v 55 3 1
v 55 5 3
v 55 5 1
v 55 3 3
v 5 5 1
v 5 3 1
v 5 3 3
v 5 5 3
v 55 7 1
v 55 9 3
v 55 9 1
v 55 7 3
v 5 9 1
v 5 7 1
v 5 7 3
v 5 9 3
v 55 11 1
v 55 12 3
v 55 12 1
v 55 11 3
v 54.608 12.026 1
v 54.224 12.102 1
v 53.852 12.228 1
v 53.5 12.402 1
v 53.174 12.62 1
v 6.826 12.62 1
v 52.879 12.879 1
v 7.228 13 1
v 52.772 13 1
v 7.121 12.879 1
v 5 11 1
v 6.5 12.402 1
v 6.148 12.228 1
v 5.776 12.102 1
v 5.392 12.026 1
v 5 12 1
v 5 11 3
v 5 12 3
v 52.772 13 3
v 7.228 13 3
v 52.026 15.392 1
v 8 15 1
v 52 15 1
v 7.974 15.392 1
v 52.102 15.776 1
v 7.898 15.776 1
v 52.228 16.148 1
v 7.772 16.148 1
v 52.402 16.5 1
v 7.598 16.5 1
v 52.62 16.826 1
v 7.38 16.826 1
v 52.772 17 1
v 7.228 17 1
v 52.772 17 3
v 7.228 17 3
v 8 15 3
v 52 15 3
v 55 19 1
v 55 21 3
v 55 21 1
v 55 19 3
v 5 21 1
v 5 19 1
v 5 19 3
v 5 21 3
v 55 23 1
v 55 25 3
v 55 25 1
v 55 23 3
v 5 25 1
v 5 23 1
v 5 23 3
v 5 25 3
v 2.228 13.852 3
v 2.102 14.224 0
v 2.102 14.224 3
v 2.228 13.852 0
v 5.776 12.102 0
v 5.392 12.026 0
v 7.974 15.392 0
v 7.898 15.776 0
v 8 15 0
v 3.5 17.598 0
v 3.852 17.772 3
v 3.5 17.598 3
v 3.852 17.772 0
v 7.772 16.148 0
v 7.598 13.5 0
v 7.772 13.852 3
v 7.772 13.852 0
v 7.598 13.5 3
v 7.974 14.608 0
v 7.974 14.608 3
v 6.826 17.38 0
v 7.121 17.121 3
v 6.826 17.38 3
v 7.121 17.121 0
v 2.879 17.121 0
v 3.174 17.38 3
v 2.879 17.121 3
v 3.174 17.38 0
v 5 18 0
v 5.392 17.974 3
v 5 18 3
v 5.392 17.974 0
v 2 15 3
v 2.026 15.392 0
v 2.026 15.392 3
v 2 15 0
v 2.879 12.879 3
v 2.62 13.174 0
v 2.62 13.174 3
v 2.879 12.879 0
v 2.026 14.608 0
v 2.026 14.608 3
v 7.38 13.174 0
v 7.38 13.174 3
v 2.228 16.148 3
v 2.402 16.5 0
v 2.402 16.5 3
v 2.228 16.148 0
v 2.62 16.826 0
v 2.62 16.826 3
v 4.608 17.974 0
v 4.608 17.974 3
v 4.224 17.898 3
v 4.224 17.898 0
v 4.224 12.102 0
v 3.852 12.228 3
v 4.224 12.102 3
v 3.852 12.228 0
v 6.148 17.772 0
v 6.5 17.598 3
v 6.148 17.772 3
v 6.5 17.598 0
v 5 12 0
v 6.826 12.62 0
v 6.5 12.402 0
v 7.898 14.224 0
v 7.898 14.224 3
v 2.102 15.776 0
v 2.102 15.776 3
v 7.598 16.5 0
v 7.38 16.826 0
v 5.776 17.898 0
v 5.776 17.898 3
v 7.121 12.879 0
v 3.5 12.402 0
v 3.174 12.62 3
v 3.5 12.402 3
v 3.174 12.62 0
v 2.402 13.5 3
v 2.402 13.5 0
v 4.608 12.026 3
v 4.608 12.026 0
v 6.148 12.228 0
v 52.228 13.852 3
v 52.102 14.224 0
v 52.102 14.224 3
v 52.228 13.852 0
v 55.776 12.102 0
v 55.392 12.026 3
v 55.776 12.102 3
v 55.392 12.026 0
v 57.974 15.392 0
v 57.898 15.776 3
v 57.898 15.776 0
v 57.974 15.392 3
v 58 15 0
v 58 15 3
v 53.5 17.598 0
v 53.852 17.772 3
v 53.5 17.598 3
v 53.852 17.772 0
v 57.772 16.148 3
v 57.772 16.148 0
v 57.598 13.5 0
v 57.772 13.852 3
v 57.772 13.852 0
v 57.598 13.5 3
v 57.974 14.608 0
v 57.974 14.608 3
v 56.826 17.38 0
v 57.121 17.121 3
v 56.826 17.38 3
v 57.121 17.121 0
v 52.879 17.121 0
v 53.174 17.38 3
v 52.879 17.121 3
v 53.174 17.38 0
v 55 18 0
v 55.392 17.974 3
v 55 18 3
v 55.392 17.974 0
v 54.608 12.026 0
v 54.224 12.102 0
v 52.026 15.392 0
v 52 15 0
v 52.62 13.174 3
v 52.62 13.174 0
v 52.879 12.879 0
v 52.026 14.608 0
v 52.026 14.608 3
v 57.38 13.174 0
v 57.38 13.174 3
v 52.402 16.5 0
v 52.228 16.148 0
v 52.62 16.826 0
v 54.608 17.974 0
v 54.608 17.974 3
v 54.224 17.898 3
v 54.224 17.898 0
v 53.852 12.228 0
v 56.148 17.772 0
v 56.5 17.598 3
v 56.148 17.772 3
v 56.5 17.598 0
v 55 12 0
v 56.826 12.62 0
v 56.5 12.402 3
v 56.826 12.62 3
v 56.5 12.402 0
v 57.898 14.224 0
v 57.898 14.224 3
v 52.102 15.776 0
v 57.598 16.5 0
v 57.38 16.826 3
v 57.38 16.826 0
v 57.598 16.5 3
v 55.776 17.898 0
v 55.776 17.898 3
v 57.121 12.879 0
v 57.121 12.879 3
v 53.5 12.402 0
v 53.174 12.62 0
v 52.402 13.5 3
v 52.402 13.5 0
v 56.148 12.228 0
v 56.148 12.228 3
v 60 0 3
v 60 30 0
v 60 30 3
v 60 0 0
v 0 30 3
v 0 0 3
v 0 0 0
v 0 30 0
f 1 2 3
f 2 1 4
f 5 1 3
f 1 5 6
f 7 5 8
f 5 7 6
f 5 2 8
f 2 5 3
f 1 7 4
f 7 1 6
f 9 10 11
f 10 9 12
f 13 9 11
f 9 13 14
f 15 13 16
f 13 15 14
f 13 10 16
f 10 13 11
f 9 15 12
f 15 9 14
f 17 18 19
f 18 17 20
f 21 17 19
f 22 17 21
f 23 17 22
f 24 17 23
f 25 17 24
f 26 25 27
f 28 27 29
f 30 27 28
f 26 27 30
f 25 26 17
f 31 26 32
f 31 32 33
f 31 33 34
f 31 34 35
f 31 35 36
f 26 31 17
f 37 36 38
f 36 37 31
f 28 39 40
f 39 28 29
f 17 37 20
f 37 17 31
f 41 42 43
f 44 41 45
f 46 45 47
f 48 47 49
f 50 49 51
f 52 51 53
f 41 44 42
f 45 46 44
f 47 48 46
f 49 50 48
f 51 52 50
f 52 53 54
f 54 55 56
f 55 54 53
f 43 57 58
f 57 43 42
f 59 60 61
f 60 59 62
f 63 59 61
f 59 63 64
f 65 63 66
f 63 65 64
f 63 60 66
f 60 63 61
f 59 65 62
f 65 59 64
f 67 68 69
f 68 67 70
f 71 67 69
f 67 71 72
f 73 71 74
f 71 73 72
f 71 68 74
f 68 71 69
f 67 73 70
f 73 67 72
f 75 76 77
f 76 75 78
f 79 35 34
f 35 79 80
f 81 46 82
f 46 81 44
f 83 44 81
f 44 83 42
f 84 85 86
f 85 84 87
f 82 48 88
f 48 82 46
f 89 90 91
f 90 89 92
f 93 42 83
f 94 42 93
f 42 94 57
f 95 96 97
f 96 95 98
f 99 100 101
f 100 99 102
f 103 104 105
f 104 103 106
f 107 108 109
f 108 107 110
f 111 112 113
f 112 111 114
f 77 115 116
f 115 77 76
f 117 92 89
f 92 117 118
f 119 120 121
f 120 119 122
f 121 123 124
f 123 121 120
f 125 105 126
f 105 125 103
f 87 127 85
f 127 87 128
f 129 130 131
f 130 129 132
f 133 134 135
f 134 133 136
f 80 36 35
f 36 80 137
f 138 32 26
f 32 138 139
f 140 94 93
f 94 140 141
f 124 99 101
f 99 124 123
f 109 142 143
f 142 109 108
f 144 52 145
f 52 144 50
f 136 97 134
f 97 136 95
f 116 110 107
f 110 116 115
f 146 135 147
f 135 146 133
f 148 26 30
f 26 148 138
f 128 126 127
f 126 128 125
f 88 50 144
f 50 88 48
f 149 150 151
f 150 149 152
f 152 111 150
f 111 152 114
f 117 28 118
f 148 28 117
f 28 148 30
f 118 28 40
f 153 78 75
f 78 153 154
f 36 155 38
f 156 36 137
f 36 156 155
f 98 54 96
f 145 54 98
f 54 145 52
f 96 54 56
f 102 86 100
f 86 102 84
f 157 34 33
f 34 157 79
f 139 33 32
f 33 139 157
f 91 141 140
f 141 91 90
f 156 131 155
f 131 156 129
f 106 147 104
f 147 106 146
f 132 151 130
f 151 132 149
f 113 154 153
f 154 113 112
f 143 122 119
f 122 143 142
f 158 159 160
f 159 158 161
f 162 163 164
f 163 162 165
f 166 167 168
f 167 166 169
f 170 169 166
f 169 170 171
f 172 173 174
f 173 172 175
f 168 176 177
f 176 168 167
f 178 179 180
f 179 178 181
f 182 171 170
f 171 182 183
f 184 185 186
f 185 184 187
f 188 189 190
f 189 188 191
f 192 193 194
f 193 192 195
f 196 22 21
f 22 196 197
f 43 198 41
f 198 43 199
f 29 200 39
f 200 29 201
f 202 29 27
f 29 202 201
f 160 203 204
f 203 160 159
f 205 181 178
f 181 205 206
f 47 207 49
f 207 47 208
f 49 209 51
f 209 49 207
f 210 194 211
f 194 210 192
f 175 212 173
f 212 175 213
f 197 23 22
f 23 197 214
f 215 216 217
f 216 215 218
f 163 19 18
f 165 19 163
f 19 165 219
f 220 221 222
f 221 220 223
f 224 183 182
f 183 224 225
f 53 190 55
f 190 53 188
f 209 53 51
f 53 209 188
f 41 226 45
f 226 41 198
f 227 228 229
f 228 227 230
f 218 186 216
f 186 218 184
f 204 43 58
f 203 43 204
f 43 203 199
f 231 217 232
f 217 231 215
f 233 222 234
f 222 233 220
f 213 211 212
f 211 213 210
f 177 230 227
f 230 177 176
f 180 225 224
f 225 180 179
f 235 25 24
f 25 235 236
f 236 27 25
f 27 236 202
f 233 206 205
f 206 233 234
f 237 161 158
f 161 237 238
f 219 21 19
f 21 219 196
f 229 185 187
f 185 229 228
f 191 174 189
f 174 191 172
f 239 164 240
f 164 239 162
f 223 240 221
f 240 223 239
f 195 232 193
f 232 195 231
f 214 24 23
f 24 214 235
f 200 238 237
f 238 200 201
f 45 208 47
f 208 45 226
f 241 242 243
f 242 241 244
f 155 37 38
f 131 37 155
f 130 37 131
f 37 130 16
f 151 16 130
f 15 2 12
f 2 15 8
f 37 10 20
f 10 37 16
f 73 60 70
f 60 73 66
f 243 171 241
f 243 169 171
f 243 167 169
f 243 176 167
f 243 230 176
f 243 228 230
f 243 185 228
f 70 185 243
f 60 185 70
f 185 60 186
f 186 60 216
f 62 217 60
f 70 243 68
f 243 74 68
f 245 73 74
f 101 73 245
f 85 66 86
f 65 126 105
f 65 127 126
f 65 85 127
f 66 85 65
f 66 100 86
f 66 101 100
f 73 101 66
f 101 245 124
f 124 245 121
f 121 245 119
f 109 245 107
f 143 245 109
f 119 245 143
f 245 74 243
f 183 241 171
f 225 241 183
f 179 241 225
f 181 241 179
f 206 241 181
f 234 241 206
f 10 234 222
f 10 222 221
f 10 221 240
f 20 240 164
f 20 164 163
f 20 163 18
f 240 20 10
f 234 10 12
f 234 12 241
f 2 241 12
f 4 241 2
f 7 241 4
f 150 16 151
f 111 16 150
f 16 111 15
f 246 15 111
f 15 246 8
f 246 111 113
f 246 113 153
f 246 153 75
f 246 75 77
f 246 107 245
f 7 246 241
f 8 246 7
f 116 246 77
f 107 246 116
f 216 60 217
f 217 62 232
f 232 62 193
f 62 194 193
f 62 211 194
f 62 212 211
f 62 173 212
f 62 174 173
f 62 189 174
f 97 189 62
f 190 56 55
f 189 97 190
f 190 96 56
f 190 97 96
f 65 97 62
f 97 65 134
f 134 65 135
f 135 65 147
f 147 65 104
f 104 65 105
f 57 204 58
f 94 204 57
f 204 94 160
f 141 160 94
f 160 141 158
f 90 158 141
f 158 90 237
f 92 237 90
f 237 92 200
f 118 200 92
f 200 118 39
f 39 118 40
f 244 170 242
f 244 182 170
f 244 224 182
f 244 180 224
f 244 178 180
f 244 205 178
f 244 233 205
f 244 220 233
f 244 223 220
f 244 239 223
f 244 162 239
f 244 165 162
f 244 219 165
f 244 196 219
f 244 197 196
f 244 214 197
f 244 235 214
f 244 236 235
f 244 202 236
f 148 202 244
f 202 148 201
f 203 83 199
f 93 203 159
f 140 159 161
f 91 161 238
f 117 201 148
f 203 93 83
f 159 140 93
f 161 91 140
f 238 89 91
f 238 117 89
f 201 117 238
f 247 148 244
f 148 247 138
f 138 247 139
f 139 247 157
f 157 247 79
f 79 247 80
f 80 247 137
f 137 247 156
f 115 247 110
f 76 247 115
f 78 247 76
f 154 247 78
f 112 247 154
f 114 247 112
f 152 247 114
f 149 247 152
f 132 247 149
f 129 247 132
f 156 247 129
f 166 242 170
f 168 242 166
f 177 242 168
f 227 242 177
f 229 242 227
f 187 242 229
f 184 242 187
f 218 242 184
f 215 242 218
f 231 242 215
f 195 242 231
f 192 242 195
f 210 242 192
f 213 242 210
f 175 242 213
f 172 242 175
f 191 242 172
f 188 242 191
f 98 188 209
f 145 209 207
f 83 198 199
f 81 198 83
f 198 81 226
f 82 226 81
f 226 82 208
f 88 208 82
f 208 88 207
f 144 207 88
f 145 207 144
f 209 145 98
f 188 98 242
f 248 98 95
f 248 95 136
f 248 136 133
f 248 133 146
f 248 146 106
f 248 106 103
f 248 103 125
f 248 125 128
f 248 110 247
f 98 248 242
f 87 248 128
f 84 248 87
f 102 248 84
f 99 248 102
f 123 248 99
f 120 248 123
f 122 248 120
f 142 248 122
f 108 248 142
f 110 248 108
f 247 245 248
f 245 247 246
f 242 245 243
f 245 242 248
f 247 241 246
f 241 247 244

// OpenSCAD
$fn=64;
module sensor_lid() {
  difference() {
    cube([60,30,3]);
    for(i=[0:5]) translate([5,3+i*4,1]) cube([50,2,3]);
    for(x=[5,55]) translate([x,15,-1]) cylinder(d=6,h=5,$fn=48);
  }
}
sensor_lid();
